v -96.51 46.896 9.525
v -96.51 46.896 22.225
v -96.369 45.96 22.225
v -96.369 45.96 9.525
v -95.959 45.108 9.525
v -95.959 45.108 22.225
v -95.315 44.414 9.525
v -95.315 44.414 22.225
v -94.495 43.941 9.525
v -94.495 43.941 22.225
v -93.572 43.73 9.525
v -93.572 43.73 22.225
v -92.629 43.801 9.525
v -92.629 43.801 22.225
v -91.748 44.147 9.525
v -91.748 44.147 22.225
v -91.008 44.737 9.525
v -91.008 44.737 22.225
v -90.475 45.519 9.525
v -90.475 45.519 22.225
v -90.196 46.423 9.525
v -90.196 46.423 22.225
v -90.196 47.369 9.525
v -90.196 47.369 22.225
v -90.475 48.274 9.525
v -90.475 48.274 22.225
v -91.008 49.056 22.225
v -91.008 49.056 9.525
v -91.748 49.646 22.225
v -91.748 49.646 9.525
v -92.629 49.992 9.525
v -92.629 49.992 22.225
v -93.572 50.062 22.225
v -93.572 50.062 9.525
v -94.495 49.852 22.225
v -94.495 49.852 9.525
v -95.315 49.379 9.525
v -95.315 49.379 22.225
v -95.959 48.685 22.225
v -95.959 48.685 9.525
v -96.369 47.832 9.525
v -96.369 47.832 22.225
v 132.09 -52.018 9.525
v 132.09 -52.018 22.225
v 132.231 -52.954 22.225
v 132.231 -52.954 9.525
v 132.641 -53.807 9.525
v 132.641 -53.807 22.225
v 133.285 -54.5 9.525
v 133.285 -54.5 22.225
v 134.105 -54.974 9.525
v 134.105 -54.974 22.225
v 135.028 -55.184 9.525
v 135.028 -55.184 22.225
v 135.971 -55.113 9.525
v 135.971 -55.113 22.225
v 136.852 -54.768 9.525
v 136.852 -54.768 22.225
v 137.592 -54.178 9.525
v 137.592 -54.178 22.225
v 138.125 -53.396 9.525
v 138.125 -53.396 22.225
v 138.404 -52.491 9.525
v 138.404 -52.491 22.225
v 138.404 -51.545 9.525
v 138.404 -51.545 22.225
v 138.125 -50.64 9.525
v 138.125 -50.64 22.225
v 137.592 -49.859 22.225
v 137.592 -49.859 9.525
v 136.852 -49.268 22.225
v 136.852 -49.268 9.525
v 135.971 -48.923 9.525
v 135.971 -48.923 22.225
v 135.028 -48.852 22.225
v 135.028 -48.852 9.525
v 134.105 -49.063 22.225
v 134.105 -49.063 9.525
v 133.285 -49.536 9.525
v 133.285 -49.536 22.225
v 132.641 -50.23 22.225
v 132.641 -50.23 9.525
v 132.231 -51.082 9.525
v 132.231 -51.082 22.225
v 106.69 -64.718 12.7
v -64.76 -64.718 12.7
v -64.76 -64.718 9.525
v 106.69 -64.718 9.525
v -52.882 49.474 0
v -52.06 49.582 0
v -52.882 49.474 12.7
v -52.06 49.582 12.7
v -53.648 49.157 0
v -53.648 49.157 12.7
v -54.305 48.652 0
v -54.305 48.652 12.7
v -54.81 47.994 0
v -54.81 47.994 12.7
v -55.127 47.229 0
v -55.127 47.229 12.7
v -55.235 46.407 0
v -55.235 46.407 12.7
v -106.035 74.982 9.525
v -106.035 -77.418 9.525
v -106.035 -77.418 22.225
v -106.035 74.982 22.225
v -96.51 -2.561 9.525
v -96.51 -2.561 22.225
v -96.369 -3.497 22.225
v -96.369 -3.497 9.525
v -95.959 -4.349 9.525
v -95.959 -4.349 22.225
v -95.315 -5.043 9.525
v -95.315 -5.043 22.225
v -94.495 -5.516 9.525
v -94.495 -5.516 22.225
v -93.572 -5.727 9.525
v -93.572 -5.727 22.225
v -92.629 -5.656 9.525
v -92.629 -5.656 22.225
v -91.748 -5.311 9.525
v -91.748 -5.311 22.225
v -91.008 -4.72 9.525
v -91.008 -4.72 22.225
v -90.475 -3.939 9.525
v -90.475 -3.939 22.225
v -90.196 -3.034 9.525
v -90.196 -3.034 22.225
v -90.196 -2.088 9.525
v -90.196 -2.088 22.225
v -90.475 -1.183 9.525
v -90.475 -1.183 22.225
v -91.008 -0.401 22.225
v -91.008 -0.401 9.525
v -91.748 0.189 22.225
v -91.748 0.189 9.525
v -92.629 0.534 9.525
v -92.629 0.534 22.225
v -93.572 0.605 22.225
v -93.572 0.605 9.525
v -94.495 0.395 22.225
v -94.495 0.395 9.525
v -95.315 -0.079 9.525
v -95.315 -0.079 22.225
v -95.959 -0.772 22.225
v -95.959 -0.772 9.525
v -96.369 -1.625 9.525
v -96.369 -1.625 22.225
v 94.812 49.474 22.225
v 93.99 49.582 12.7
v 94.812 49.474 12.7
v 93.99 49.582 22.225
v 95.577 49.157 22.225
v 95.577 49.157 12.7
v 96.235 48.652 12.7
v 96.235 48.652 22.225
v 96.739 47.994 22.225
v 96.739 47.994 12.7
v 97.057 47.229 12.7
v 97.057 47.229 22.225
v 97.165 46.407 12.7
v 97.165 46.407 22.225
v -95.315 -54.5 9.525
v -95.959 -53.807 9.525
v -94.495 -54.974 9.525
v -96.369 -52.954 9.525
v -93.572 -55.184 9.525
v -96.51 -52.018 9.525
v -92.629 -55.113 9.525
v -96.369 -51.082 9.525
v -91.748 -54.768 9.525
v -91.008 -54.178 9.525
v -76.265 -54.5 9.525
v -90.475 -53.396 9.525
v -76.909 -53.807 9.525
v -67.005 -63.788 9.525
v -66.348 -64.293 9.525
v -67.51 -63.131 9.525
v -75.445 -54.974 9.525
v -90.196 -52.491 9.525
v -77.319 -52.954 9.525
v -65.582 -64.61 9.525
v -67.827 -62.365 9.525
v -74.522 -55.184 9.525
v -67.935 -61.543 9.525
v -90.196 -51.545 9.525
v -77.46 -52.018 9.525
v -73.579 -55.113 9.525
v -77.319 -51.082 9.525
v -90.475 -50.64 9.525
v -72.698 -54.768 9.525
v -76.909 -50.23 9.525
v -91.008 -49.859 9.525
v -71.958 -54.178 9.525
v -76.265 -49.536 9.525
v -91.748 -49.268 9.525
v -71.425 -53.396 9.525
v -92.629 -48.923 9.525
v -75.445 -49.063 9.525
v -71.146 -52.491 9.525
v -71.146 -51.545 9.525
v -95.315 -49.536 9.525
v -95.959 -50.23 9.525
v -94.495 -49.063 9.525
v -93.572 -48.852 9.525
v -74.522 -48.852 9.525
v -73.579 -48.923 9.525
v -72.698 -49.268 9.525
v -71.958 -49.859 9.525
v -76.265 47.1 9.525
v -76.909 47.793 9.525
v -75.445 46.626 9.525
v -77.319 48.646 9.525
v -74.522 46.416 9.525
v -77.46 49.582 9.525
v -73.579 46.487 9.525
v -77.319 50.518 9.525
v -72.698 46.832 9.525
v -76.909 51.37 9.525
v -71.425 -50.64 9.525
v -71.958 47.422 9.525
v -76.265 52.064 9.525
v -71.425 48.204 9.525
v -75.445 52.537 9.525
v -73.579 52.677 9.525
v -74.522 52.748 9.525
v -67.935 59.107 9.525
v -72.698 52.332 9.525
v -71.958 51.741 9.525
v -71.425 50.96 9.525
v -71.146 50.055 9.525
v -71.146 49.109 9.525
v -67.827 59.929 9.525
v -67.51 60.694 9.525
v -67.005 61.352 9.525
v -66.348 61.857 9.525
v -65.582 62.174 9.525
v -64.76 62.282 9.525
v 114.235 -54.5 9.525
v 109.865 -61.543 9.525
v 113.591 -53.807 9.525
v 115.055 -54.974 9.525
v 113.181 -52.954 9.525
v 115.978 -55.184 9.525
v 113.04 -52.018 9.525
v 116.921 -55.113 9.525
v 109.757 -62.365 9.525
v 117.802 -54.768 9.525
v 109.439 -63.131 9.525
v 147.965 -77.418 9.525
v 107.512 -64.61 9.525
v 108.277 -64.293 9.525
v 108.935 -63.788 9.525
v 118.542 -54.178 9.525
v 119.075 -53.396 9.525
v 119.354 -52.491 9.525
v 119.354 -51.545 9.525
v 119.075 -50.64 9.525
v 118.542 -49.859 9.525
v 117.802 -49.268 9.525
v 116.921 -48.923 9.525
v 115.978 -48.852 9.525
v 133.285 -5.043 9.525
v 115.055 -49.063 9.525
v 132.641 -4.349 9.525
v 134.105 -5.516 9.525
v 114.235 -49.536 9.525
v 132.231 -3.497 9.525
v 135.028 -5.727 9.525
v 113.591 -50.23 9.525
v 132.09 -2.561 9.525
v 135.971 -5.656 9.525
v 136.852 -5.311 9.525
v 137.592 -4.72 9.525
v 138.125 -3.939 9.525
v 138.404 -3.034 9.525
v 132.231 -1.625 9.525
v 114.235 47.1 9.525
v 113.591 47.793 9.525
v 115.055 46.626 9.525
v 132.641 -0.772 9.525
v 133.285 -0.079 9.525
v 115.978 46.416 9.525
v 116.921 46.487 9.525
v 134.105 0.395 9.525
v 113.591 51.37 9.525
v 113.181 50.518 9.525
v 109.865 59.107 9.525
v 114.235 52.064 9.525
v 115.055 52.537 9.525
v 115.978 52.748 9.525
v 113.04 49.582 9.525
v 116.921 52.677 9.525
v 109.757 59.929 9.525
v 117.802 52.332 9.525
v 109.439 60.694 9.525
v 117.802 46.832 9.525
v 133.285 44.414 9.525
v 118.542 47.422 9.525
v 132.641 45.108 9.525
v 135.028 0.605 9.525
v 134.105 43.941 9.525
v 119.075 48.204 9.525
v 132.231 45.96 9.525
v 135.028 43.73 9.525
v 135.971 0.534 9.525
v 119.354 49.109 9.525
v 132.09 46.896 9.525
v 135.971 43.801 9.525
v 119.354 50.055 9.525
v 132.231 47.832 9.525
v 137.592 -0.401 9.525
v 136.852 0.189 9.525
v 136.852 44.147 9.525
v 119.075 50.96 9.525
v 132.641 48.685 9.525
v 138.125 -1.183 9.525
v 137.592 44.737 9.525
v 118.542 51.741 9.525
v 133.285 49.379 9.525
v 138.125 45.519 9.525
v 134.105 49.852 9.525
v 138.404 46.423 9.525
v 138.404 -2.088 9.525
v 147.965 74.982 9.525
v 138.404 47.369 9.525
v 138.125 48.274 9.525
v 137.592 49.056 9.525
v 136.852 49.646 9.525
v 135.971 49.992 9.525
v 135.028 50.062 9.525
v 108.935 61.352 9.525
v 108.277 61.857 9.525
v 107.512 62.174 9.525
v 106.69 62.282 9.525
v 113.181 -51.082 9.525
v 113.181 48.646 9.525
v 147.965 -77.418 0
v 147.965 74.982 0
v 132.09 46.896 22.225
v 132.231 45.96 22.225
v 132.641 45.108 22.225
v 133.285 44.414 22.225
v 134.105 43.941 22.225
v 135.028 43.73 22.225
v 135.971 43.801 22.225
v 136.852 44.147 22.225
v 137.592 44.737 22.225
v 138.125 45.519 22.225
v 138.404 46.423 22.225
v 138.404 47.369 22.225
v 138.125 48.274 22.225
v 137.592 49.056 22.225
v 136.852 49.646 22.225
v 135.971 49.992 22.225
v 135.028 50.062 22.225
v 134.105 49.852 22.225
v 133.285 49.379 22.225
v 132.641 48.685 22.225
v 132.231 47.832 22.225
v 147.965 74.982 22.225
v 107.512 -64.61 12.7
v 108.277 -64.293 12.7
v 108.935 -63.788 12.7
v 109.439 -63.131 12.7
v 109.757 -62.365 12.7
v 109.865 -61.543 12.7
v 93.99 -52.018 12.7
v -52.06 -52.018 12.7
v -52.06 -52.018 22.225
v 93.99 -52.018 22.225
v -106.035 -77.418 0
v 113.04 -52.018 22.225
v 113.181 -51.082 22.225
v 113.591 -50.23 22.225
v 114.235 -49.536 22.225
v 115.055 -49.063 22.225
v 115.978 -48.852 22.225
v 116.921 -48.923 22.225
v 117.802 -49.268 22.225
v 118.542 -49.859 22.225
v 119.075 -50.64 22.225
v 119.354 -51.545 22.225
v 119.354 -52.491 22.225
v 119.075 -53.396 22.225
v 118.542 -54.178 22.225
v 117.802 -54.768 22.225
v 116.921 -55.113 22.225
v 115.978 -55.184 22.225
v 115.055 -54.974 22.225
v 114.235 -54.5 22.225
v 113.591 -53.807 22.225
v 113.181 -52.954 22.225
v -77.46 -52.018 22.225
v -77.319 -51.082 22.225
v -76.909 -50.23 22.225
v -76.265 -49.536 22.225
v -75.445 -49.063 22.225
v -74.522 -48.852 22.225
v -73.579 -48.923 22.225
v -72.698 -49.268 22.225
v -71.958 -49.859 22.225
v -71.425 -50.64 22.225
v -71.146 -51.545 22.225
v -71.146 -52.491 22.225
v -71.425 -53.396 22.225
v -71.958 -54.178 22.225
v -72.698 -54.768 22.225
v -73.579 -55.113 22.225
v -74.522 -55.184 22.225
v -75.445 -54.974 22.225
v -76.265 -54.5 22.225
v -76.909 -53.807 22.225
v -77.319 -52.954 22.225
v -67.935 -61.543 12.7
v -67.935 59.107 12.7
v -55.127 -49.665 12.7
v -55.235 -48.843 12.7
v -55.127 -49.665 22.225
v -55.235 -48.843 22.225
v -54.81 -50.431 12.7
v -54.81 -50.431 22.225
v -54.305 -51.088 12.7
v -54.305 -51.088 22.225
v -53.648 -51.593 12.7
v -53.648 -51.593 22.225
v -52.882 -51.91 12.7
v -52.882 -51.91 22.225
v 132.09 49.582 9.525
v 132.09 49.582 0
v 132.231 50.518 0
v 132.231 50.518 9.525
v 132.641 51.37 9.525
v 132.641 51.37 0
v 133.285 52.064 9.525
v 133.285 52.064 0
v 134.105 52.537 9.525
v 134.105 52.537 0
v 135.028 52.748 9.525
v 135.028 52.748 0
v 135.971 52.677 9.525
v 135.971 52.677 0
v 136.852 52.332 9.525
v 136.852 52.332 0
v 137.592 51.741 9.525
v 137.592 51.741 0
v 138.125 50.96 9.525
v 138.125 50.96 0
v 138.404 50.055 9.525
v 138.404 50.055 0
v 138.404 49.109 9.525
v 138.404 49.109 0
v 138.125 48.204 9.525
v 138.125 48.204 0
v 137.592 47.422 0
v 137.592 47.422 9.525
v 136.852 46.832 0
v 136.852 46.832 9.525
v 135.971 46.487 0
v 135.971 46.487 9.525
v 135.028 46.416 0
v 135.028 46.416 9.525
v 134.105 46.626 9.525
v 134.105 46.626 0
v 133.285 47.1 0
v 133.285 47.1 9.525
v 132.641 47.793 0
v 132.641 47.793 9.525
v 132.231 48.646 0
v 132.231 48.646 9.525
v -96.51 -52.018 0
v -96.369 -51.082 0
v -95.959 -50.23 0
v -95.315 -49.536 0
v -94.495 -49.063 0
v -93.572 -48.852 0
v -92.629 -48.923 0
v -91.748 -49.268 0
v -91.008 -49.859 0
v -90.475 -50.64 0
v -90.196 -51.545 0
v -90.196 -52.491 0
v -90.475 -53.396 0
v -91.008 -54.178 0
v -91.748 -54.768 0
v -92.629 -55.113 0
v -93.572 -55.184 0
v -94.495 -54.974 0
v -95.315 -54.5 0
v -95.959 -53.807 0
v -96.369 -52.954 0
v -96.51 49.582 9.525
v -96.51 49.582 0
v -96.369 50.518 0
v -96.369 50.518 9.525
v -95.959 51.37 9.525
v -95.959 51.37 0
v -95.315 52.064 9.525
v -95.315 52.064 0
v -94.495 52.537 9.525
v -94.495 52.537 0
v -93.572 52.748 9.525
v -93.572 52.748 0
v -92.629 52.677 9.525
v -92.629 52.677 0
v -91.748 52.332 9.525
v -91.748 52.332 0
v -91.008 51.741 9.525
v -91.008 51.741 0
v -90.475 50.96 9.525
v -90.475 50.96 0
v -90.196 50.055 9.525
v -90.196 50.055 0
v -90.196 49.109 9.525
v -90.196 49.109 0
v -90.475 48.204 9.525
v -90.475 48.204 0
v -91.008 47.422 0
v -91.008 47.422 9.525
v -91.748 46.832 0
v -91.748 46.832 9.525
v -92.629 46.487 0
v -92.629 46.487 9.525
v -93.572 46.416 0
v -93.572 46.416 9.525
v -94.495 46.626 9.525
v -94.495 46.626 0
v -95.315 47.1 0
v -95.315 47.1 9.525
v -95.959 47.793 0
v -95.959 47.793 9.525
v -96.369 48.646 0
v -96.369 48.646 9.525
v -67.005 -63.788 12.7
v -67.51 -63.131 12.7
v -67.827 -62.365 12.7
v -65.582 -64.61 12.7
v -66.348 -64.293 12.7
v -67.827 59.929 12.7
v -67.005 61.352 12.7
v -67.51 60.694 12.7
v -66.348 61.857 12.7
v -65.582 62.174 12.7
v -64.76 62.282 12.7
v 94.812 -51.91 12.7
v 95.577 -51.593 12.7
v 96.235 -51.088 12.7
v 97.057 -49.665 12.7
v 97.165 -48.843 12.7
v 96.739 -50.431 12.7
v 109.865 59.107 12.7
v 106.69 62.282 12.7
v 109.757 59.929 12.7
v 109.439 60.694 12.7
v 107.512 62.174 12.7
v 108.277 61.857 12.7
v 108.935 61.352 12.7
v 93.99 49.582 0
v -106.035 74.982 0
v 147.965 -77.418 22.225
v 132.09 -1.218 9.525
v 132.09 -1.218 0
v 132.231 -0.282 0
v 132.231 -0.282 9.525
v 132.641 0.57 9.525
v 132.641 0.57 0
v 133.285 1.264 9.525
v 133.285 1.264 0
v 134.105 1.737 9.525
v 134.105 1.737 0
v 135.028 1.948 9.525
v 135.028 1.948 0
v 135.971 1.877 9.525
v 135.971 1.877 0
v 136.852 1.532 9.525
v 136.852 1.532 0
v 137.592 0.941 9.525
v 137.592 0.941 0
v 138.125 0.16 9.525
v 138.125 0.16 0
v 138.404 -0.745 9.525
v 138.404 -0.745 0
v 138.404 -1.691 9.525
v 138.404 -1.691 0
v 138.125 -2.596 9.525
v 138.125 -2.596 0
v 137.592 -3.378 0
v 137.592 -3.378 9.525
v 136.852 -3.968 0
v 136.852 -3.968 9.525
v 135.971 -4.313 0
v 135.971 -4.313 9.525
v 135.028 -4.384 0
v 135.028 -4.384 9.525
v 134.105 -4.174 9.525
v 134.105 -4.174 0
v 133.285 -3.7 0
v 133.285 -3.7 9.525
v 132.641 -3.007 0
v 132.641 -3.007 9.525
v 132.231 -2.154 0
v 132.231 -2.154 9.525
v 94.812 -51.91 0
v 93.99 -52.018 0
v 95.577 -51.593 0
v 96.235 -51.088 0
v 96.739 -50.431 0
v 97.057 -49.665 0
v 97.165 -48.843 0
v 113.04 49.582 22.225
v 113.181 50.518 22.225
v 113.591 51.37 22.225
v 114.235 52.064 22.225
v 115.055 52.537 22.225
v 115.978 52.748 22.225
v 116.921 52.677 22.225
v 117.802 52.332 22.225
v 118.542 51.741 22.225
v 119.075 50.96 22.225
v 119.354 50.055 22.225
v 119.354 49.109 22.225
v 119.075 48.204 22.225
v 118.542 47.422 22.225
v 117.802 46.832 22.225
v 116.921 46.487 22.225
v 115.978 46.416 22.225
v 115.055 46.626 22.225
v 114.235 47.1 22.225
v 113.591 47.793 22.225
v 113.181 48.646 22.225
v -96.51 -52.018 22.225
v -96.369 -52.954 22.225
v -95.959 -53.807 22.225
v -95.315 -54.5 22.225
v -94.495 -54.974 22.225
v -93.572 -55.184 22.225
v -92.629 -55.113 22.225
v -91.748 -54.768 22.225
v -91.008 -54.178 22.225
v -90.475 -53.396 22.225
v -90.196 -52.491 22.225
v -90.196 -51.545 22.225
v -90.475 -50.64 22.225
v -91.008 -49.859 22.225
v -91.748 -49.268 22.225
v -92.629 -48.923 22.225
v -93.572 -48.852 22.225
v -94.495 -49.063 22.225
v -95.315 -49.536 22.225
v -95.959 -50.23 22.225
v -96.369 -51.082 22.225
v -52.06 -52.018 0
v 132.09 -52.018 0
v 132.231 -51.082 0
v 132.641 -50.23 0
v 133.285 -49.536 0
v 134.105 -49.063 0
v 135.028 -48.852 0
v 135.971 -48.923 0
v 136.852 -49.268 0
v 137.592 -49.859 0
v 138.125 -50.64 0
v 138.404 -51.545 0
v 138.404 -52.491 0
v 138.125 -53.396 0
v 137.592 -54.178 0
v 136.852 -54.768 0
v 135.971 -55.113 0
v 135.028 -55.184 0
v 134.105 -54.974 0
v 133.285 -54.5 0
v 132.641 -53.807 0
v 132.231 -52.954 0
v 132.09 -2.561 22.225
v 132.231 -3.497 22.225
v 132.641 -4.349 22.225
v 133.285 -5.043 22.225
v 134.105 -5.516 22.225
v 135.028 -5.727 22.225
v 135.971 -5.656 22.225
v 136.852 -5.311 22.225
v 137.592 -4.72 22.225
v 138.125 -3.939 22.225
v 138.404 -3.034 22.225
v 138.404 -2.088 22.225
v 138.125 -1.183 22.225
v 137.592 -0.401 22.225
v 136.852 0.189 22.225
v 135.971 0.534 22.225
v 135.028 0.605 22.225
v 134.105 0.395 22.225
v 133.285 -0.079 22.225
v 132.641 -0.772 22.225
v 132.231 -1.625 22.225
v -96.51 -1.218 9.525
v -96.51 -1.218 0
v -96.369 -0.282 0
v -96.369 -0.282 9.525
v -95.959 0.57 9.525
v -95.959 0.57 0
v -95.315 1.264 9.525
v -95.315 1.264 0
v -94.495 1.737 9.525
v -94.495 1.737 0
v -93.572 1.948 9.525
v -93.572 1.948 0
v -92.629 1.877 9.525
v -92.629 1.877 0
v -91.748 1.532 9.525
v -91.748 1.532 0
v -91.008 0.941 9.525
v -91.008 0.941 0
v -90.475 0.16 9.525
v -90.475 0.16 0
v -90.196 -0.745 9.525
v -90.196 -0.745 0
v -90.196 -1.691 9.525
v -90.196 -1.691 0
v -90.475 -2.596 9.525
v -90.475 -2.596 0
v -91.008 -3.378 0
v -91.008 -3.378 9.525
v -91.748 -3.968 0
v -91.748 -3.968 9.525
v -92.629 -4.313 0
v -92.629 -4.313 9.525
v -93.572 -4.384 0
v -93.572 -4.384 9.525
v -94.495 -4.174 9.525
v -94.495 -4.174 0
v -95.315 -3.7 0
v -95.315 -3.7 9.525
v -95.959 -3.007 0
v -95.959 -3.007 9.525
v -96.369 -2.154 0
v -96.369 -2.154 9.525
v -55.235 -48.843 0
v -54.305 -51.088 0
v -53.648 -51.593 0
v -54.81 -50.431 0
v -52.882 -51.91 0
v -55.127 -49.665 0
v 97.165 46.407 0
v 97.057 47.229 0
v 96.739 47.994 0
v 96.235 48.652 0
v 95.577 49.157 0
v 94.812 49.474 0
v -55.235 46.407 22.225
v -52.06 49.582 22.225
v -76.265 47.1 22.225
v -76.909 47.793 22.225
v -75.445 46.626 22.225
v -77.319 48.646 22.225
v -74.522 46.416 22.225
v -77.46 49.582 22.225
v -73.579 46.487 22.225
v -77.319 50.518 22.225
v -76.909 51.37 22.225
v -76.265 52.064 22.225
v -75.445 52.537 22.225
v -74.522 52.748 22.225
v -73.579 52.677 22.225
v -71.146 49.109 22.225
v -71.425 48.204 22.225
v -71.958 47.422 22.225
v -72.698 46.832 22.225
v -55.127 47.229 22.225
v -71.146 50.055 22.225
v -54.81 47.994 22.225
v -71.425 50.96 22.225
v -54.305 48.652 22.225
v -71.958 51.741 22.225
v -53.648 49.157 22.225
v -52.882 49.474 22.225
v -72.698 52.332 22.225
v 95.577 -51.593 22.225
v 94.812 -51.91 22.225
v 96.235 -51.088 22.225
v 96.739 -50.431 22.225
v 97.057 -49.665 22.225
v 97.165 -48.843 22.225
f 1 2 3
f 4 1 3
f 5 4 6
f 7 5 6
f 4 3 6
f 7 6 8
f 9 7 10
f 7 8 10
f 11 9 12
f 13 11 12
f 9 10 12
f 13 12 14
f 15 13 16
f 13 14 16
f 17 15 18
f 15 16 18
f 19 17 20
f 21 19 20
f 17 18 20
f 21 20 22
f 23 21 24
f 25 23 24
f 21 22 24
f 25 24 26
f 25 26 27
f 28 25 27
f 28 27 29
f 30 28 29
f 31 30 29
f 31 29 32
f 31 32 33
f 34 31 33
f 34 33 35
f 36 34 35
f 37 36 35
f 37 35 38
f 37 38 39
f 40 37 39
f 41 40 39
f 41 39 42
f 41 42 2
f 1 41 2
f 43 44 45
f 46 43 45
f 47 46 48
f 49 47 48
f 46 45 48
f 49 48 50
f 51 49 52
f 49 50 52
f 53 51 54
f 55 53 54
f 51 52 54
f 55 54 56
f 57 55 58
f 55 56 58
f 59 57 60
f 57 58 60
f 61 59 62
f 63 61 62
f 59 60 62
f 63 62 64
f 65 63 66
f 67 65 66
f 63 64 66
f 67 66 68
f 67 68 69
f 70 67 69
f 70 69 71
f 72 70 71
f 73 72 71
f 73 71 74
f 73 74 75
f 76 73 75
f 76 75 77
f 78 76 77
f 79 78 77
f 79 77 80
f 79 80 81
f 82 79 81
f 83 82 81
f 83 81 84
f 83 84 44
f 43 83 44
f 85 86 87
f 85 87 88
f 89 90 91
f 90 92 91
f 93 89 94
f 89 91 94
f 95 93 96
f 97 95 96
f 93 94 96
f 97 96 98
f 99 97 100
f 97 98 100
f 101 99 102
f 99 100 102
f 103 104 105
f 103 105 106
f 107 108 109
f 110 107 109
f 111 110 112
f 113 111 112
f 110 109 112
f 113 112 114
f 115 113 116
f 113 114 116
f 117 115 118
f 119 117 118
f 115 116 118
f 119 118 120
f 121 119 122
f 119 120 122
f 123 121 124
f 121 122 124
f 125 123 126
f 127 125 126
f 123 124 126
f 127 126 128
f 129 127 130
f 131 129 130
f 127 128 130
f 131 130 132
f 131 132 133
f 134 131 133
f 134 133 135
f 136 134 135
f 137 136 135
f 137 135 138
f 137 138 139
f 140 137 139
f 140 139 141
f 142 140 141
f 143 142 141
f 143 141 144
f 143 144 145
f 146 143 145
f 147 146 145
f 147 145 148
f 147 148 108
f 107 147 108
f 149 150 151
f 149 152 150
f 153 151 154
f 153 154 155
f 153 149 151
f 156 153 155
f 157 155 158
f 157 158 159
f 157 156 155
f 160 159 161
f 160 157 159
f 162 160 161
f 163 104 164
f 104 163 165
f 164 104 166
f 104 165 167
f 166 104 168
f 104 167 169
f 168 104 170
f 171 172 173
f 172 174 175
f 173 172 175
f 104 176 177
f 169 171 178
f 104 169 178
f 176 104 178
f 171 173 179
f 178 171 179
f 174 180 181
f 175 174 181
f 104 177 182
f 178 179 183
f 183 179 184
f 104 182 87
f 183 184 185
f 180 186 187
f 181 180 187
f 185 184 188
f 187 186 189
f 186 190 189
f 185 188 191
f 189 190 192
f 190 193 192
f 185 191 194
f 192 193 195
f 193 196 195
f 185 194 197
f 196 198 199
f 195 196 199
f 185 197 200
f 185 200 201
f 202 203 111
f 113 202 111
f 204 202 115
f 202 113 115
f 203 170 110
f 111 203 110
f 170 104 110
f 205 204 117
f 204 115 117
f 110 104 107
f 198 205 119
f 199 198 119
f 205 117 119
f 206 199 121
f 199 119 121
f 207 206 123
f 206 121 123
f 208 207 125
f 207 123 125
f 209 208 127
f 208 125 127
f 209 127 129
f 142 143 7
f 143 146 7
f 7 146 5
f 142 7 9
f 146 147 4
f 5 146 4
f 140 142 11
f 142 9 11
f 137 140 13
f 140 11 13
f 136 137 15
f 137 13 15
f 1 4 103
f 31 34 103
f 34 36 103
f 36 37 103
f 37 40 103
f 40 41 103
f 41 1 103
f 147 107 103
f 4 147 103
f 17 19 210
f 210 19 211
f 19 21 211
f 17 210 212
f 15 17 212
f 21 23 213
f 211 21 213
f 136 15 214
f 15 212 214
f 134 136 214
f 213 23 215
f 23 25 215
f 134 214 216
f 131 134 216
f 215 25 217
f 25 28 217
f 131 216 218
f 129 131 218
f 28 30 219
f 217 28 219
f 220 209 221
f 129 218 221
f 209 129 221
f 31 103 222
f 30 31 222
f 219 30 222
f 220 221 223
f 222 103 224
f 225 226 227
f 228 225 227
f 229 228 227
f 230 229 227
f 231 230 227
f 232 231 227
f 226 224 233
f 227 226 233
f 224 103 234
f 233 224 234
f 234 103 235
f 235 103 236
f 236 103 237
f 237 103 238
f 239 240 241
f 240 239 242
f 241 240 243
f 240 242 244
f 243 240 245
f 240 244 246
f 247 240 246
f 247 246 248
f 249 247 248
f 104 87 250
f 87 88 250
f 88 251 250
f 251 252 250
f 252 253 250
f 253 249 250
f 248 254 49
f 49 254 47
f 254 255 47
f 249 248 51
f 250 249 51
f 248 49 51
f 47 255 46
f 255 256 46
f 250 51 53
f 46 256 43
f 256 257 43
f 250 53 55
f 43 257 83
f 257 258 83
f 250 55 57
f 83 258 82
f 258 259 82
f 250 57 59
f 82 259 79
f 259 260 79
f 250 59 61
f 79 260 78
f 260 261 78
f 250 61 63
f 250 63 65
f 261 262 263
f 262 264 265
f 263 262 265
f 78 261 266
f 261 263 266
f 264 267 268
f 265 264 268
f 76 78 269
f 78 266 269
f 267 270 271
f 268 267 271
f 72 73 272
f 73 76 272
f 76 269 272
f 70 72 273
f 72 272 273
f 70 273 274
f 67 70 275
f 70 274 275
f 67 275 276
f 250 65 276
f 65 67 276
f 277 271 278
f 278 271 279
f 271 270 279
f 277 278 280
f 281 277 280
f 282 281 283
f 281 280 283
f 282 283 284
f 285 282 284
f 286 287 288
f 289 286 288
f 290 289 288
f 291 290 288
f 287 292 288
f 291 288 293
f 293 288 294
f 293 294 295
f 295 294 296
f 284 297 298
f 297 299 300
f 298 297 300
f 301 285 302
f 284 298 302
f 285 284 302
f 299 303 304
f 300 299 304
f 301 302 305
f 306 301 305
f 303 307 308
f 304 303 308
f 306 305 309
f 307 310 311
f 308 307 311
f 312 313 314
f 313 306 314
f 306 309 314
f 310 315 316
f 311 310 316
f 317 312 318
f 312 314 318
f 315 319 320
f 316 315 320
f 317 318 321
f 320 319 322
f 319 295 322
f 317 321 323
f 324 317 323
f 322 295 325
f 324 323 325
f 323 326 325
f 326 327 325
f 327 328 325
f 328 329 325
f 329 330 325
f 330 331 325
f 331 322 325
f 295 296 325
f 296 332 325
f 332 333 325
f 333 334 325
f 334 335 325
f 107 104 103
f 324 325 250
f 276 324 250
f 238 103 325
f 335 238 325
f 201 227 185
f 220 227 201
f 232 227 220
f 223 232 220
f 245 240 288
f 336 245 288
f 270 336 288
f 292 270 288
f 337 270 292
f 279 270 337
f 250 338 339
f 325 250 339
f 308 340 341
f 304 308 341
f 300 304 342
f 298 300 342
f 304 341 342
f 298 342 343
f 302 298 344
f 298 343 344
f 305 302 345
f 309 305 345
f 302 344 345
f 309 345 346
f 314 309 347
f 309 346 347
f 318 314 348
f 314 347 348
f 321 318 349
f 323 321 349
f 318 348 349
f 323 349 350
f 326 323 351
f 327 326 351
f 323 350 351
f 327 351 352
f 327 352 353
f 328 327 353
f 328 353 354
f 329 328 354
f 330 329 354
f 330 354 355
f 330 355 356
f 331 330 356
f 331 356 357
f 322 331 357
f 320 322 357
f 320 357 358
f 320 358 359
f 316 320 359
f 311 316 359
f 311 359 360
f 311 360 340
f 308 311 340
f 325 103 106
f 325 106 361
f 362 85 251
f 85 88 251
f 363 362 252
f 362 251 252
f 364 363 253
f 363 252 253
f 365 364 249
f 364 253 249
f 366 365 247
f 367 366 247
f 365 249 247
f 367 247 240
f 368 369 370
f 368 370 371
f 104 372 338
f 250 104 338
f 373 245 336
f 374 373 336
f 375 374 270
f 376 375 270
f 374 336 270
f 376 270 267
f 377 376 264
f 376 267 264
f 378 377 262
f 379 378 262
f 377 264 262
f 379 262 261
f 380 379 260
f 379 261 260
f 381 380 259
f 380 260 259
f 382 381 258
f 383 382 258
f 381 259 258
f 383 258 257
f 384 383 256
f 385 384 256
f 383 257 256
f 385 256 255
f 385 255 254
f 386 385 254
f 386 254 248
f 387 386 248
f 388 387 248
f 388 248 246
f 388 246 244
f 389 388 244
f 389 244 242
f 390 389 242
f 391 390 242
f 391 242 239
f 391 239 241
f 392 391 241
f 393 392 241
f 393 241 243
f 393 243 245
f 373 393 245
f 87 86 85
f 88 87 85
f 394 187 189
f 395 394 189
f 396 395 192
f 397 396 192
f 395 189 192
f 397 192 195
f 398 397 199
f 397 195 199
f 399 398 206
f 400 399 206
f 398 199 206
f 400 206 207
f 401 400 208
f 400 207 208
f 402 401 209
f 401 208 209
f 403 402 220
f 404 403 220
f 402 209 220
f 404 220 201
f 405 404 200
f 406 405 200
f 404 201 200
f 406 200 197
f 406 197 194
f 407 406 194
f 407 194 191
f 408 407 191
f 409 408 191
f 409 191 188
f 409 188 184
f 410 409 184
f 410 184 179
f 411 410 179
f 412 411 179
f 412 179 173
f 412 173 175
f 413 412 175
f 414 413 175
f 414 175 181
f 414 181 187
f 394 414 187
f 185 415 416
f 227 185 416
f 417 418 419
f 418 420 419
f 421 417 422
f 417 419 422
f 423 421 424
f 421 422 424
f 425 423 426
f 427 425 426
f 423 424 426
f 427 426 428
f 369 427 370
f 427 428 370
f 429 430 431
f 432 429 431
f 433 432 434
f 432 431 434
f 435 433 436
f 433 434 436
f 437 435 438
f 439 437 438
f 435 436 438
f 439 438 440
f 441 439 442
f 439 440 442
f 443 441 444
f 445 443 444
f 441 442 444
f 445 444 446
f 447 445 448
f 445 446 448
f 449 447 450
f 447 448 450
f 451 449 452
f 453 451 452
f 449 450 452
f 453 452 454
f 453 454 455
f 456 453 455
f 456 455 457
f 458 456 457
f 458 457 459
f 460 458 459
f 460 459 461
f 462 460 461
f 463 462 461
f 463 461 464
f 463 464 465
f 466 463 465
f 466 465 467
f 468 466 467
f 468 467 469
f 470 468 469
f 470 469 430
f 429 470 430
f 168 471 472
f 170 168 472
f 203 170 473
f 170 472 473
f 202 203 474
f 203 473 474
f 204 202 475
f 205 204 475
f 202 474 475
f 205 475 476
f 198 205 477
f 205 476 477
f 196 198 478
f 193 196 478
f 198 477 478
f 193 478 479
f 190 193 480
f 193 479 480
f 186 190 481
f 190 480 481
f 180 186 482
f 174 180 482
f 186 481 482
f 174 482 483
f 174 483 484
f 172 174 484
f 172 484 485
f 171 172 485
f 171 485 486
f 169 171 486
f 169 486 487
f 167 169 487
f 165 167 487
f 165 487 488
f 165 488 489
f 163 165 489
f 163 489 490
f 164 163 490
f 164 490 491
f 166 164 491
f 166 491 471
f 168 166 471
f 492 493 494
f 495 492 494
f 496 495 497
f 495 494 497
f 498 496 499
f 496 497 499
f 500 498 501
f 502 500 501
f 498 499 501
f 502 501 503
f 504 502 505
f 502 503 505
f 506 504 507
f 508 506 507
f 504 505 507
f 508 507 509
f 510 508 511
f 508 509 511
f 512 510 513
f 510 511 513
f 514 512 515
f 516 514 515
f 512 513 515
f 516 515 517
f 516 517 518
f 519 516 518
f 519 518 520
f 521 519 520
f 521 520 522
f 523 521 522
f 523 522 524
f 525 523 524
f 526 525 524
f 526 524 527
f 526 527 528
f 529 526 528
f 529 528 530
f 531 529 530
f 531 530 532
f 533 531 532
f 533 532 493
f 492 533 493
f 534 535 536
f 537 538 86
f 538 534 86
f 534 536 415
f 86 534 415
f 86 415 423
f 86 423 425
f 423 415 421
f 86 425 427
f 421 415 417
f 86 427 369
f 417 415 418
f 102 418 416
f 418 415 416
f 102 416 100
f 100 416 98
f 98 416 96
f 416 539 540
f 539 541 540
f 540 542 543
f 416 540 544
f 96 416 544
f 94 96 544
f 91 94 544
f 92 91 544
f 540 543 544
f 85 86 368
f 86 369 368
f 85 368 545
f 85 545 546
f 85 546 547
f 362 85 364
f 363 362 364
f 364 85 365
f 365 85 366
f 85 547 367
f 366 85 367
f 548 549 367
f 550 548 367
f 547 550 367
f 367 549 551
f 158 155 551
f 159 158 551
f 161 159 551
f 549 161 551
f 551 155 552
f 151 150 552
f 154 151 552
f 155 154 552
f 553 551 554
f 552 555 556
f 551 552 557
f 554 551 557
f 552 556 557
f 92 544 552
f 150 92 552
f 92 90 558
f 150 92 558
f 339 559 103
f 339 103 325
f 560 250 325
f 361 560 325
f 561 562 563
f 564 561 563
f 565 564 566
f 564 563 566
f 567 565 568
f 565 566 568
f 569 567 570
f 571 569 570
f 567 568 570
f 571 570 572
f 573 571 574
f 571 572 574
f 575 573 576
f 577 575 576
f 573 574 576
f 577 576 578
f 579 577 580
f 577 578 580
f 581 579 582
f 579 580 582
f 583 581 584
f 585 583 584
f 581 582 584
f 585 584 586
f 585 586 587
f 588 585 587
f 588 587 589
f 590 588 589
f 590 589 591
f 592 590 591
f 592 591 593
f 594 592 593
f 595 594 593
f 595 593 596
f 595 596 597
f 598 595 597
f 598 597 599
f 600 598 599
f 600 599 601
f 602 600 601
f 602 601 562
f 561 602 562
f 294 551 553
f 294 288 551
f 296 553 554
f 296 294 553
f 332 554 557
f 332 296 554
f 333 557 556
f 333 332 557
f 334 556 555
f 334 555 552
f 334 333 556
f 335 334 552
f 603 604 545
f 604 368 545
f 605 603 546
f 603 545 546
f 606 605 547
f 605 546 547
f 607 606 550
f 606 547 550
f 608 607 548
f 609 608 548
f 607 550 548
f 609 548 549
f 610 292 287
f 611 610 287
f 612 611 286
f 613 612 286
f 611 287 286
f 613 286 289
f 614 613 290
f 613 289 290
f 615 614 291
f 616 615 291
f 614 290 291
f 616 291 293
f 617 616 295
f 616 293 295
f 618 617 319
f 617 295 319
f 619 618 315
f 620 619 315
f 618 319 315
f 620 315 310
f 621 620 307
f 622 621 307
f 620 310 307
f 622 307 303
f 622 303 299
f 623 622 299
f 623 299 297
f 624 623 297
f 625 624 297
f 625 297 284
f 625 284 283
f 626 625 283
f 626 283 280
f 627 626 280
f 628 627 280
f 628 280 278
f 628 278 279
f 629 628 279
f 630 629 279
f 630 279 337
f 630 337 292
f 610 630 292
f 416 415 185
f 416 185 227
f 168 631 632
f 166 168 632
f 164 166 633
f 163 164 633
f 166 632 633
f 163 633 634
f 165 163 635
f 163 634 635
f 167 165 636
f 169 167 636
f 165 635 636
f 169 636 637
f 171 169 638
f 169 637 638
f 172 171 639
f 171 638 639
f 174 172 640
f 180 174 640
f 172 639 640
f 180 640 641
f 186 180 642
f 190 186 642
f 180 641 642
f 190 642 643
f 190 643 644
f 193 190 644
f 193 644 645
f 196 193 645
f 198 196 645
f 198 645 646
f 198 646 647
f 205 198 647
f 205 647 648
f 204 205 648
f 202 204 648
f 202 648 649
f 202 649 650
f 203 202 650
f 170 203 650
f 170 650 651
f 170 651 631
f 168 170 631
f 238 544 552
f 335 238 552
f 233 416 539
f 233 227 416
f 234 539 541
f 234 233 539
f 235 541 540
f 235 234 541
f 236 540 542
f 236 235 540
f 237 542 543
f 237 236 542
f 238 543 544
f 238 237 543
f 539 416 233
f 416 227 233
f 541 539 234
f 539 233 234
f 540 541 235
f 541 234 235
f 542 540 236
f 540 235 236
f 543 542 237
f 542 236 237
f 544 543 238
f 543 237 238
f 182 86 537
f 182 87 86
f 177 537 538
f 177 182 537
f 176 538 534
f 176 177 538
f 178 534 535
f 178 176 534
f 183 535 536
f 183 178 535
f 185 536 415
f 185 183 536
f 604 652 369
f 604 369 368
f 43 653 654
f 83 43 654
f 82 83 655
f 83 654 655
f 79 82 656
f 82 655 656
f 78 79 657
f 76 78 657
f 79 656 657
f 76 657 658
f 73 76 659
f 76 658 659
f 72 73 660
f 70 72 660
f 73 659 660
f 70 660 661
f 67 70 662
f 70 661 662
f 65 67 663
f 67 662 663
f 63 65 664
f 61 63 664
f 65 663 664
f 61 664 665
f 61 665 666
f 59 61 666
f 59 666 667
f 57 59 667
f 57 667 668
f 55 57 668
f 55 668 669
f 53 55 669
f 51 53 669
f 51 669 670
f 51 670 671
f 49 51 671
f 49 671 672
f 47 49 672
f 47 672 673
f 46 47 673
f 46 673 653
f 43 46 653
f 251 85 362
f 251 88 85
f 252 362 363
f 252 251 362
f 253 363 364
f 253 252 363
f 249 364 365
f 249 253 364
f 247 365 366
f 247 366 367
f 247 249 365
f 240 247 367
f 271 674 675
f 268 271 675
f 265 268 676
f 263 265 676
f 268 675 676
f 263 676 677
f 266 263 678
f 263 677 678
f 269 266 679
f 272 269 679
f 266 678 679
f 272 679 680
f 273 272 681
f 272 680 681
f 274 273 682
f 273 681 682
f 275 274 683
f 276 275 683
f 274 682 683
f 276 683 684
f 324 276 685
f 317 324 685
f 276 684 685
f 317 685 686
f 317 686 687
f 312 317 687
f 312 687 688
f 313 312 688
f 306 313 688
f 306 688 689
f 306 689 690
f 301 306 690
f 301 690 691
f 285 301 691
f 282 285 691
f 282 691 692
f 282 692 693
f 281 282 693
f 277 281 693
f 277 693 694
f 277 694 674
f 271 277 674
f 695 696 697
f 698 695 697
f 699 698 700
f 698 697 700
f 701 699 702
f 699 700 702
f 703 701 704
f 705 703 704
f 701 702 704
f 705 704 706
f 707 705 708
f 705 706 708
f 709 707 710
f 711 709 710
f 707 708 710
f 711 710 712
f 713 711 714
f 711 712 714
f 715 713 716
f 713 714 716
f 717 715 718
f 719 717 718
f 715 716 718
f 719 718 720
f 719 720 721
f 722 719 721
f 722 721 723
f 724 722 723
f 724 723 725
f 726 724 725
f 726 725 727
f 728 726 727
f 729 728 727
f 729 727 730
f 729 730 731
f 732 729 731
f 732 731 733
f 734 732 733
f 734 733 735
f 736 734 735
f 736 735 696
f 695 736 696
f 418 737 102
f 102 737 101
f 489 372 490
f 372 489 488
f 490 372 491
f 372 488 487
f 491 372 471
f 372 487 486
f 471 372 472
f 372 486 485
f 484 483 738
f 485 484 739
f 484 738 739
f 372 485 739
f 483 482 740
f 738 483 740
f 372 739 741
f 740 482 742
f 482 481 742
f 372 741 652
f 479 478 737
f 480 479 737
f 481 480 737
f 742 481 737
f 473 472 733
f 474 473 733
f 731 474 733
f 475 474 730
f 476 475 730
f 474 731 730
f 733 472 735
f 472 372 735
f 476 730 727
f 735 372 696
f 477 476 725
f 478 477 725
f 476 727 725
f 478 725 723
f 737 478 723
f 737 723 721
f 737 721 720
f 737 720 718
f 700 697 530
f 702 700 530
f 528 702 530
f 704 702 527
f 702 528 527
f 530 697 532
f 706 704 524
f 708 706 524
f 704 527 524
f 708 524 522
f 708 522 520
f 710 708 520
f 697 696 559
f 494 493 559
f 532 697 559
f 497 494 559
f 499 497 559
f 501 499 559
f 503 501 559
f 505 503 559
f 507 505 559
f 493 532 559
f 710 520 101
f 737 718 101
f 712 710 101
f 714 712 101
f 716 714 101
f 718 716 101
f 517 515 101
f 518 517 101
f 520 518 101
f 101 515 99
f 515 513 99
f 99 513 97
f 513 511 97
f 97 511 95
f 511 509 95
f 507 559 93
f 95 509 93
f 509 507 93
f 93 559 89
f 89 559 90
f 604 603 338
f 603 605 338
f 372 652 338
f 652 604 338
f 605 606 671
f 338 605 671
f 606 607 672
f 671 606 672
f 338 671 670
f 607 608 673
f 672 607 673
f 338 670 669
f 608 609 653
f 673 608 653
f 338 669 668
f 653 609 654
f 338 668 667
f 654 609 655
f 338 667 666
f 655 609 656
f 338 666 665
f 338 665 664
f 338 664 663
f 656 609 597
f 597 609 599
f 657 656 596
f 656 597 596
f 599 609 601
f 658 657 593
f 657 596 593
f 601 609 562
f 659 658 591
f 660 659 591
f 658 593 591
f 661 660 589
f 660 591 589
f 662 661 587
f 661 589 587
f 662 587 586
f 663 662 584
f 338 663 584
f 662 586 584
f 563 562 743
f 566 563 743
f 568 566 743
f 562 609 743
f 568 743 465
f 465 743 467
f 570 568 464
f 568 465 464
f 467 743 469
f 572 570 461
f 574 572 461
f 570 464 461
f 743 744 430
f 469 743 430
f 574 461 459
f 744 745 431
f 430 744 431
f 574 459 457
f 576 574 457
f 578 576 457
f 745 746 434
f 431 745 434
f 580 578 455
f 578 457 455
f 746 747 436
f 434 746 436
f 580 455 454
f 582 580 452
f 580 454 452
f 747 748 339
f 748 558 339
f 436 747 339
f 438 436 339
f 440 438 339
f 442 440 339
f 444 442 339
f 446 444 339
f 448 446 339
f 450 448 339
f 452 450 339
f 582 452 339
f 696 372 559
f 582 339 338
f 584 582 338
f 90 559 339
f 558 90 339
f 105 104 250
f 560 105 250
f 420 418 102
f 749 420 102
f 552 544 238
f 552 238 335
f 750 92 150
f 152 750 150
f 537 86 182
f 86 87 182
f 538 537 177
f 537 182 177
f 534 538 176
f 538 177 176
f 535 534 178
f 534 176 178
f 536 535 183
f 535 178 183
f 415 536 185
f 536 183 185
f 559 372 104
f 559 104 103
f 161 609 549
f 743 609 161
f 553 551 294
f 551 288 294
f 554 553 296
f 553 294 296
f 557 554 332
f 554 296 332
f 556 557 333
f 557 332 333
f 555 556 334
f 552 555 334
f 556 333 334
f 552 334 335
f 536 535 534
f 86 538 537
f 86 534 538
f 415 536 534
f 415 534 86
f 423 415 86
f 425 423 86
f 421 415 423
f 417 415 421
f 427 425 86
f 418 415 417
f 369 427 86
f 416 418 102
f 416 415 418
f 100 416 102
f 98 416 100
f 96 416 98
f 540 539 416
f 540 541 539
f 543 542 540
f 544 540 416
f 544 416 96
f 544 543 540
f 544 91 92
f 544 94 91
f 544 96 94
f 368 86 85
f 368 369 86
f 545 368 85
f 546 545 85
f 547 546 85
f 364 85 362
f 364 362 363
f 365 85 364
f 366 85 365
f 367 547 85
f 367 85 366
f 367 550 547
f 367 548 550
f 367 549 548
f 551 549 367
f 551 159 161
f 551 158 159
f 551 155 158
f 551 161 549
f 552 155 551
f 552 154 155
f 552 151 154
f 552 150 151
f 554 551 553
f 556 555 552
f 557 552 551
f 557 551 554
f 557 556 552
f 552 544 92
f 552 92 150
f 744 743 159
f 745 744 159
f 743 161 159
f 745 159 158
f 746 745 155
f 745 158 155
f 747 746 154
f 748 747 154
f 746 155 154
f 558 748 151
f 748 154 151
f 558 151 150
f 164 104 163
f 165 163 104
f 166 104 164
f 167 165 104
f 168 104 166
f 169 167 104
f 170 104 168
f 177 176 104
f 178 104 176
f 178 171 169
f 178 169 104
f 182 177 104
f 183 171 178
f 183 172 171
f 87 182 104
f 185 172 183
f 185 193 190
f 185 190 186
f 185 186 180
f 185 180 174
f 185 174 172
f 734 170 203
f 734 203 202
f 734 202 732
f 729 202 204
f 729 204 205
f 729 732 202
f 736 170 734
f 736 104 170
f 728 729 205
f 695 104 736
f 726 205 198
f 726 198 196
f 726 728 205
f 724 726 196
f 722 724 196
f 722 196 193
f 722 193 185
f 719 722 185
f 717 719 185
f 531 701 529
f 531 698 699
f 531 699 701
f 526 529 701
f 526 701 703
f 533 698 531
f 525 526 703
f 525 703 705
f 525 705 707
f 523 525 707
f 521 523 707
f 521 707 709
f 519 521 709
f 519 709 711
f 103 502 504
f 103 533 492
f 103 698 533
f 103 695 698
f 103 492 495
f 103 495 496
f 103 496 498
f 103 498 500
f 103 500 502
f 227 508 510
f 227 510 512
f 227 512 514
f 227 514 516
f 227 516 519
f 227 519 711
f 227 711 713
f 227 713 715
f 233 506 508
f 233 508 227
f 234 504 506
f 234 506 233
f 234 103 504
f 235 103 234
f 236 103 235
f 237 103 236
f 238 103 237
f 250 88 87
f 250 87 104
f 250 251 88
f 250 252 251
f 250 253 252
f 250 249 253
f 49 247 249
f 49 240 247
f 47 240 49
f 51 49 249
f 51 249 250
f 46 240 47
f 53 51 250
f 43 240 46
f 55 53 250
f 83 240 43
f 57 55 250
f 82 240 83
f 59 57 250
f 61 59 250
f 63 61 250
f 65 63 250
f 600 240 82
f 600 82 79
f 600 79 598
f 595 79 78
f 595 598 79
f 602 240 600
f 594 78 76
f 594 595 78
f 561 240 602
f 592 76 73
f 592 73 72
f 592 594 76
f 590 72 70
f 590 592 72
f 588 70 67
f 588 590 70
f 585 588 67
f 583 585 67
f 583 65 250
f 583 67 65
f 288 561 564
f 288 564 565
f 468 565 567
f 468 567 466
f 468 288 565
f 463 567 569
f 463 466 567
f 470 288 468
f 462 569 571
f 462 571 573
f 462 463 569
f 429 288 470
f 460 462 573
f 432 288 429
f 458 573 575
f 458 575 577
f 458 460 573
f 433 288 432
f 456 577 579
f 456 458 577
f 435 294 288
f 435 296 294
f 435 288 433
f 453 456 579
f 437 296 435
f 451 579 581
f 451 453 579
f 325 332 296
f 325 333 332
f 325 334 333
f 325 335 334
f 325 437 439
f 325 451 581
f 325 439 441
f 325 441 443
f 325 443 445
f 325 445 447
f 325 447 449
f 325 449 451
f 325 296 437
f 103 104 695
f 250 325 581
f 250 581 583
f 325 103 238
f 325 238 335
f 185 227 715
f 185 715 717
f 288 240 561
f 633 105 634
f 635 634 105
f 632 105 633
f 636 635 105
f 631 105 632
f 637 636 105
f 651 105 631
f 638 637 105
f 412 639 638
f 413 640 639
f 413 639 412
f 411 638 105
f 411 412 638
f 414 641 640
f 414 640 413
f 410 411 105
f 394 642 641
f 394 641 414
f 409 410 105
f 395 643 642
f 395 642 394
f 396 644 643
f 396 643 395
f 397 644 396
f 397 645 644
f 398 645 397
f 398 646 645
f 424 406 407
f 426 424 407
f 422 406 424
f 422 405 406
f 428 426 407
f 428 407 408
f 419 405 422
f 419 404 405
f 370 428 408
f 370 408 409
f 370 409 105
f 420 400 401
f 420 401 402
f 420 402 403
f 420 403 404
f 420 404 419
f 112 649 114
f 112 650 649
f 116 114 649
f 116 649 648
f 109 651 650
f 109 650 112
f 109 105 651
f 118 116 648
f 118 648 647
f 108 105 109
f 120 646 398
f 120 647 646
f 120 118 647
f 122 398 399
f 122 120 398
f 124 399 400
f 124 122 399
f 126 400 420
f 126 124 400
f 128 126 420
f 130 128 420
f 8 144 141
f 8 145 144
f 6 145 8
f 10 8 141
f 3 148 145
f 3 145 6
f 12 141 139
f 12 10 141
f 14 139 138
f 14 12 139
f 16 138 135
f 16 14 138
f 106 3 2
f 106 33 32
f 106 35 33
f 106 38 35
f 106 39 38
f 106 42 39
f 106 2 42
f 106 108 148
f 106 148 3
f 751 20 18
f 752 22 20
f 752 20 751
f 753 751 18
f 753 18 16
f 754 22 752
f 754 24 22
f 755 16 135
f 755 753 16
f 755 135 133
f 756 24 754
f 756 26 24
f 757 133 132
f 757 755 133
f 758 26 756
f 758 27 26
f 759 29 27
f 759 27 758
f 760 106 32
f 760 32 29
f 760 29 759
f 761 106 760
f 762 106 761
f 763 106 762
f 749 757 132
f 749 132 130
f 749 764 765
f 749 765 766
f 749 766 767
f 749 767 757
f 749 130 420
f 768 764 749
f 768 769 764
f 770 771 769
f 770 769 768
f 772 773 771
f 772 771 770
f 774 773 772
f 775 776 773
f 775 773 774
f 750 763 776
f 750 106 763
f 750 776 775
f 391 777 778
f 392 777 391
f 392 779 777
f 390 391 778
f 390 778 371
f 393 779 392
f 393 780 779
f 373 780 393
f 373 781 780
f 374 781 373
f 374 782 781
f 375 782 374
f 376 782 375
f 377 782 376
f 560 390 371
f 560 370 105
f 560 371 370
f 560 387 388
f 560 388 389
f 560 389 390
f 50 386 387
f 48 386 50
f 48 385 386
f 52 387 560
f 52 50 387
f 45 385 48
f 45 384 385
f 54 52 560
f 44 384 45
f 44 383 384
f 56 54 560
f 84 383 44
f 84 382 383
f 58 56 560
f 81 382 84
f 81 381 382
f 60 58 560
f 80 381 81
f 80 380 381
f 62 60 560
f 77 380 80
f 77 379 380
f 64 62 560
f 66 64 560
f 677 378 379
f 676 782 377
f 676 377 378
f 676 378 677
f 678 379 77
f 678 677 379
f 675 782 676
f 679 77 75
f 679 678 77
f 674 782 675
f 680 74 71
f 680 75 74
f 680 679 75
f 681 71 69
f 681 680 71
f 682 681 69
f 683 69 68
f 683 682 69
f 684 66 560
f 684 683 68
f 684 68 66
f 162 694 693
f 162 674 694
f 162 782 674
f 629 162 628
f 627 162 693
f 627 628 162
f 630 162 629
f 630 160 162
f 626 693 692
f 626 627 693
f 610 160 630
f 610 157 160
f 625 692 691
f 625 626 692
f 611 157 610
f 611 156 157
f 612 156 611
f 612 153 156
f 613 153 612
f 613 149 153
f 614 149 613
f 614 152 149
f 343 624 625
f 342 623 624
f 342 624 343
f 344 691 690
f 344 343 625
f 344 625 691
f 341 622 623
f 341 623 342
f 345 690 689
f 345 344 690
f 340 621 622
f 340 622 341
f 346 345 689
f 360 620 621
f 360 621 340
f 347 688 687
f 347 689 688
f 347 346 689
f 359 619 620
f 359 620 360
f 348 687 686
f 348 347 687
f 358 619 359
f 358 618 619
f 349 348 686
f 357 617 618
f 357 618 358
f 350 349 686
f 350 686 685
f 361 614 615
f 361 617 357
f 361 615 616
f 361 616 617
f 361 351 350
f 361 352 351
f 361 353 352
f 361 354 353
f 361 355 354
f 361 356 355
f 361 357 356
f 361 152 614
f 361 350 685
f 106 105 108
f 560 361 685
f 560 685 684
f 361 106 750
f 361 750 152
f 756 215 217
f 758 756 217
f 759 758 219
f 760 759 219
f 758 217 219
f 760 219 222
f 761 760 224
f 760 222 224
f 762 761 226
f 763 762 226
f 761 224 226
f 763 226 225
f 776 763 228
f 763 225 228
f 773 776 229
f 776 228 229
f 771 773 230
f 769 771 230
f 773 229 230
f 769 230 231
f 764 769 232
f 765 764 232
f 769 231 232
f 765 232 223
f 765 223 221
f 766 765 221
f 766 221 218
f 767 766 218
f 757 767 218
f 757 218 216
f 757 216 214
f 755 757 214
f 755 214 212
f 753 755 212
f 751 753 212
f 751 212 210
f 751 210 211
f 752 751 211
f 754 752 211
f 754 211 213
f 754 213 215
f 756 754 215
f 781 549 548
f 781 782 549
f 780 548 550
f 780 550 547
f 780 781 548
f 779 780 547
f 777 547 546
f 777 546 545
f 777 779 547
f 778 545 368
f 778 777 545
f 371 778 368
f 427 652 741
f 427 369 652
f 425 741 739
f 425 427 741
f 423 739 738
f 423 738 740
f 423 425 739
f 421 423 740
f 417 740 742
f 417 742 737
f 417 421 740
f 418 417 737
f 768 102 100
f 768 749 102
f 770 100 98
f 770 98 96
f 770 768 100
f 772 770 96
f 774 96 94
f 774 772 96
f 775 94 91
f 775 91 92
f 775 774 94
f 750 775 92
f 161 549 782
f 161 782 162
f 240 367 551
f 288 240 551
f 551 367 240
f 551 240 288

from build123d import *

# Parameters (mm, degrees)
F0_W     = 254
F0_H     = 152.4
F0_W_2   = 152.4
F0_H_2   = 101.6
F1_DEPTH = 12.7
F2_W     = 254
F2_H     = 152.4
F2_W_2   = 177.8
F2_H_2   = 127
F3_DEPTH = 3.175
F4_R     = 3.175
F6_D     = 6.35
F7_R     = 3.175
F8_W     = 254
F8_H     = 152.4
F8_W_2   = 152.4
F8_H_2   = 101.6
F9_DEPTH = 12.7
F11_R    = 3.175
F13_D    = 6.35
F15_D    = 6.35


with BuildPart() as f1:
    # F0 (on Top) → F1 (new body)
    with BuildSketch(Plane.XY):
        with Locations((20.9647924063, -1.2180674821)):
            Rectangle(F0_W, F0_H)
        with Locations((20.9647924063, -1.2180674821)):
            Rectangle(F0_W_2, F0_H_2, mode=Mode.SUBTRACT)
    extrude(amount=F1_DEPTH)

    # F2 (on face) → F3 (cut)
    with BuildSketch(Plane.XY.offset(12.7)):
        with Locations((20.9647924063, -1.2180674821)):
            Rectangle(F2_W, F2_H)
        with Locations((20.9647924063, -1.2180674821)):
            Rectangle(F2_W_2, F2_H_2, mode=Mode.SUBTRACT)
    extrude(amount=-F3_DEPTH, mode=Mode.SUBTRACT)

    # F4
    f4_edges = [f1.edges().sort_by_distance(p)[0] for p in [
        (-55.235208, 49.581933, 6.35),
        (-55.235208, -52.018067, 6.35),
        (97.164792, -52.018067, 6.35),
        (97.164792, 49.581933, 6.35),
    ]]
    fillet(f4_edges, radius=F4_R)

    # F6 (through all)
    with Locations(Plane.XY.offset(9.525)):
        with Locations((135.2647924063, 49.5819325179), (135.2647924063, -1.2180674821), (135.2647924063, -52.0180674821), (-93.3352075937, -1.2180674821), (-93.3352075937, -52.0180674821), (-93.3352075937, 49.5819325179)):
            Hole(F6_D / 2)

    # F7
    f7_edges = [f1.edges().sort_by_distance(p)[0] for p in [
        (109.864792, 62.281933, 11.1125),
        (-67.935208, 62.281933, 11.1125),
        (-67.935208, -64.718067, 11.1125),
        (109.864792, -64.718067, 11.1125),
    ]]
    fillet(f7_edges, radius=F7_R)


with BuildPart() as f9:
    # F8 (on face) → F9 (new body)
    with BuildSketch(Plane.XY.offset(9.525)):
        with Locations((20.9647924063, -1.2180674821)):
            Rectangle(F8_W, F8_H)
        with Locations((20.9647924063, -1.2180674821)):
            Rectangle(F8_W_2, F8_H_2, mode=Mode.SUBTRACT)
    extrude(amount=F9_DEPTH)

    # F10: cut F1
    add(f1.part, mode=Mode.SUBTRACT)

    # F11
    f11_edges = [f9.edges().sort_by_distance(p)[0] for p in [
        (97.164792, -52.018067, 17.4625),
        (97.164792, 49.581933, 17.4625),
        (-55.235208, 49.581933, 17.4625),
        (-55.235208, -52.018067, 17.4625),
    ]]
    fillet(f11_edges, radius=F11_R)

    # F13 (through all)
    with Locations(Plane(origin=(0, 0, 9.525), x_dir=(1, 0, 0), z_dir=(0, 0, -1))):
        with Locations((-93.3352075937, 52.0180674821), (-93.3352075937, 2.5609232888), (-93.3352075937, -46.8962209046), (135.2647924063, 52.0180674821), (135.2647924063, 2.5609232888), (135.2647924063, -46.8962209046)):
            Hole(F13_D / 2)

    # F15 (through all)
    with Locations(Plane.XY.offset(22.225)):
        with Locations((-74.2852075937, 49.5819325179), (-74.2852075937, -52.0180674821), (116.2147924063, -52.0180674821), (116.2147924063, 49.5819325179)):
            Hole(F15_D / 2)


solid = Compound([f1.part, f9.part])
